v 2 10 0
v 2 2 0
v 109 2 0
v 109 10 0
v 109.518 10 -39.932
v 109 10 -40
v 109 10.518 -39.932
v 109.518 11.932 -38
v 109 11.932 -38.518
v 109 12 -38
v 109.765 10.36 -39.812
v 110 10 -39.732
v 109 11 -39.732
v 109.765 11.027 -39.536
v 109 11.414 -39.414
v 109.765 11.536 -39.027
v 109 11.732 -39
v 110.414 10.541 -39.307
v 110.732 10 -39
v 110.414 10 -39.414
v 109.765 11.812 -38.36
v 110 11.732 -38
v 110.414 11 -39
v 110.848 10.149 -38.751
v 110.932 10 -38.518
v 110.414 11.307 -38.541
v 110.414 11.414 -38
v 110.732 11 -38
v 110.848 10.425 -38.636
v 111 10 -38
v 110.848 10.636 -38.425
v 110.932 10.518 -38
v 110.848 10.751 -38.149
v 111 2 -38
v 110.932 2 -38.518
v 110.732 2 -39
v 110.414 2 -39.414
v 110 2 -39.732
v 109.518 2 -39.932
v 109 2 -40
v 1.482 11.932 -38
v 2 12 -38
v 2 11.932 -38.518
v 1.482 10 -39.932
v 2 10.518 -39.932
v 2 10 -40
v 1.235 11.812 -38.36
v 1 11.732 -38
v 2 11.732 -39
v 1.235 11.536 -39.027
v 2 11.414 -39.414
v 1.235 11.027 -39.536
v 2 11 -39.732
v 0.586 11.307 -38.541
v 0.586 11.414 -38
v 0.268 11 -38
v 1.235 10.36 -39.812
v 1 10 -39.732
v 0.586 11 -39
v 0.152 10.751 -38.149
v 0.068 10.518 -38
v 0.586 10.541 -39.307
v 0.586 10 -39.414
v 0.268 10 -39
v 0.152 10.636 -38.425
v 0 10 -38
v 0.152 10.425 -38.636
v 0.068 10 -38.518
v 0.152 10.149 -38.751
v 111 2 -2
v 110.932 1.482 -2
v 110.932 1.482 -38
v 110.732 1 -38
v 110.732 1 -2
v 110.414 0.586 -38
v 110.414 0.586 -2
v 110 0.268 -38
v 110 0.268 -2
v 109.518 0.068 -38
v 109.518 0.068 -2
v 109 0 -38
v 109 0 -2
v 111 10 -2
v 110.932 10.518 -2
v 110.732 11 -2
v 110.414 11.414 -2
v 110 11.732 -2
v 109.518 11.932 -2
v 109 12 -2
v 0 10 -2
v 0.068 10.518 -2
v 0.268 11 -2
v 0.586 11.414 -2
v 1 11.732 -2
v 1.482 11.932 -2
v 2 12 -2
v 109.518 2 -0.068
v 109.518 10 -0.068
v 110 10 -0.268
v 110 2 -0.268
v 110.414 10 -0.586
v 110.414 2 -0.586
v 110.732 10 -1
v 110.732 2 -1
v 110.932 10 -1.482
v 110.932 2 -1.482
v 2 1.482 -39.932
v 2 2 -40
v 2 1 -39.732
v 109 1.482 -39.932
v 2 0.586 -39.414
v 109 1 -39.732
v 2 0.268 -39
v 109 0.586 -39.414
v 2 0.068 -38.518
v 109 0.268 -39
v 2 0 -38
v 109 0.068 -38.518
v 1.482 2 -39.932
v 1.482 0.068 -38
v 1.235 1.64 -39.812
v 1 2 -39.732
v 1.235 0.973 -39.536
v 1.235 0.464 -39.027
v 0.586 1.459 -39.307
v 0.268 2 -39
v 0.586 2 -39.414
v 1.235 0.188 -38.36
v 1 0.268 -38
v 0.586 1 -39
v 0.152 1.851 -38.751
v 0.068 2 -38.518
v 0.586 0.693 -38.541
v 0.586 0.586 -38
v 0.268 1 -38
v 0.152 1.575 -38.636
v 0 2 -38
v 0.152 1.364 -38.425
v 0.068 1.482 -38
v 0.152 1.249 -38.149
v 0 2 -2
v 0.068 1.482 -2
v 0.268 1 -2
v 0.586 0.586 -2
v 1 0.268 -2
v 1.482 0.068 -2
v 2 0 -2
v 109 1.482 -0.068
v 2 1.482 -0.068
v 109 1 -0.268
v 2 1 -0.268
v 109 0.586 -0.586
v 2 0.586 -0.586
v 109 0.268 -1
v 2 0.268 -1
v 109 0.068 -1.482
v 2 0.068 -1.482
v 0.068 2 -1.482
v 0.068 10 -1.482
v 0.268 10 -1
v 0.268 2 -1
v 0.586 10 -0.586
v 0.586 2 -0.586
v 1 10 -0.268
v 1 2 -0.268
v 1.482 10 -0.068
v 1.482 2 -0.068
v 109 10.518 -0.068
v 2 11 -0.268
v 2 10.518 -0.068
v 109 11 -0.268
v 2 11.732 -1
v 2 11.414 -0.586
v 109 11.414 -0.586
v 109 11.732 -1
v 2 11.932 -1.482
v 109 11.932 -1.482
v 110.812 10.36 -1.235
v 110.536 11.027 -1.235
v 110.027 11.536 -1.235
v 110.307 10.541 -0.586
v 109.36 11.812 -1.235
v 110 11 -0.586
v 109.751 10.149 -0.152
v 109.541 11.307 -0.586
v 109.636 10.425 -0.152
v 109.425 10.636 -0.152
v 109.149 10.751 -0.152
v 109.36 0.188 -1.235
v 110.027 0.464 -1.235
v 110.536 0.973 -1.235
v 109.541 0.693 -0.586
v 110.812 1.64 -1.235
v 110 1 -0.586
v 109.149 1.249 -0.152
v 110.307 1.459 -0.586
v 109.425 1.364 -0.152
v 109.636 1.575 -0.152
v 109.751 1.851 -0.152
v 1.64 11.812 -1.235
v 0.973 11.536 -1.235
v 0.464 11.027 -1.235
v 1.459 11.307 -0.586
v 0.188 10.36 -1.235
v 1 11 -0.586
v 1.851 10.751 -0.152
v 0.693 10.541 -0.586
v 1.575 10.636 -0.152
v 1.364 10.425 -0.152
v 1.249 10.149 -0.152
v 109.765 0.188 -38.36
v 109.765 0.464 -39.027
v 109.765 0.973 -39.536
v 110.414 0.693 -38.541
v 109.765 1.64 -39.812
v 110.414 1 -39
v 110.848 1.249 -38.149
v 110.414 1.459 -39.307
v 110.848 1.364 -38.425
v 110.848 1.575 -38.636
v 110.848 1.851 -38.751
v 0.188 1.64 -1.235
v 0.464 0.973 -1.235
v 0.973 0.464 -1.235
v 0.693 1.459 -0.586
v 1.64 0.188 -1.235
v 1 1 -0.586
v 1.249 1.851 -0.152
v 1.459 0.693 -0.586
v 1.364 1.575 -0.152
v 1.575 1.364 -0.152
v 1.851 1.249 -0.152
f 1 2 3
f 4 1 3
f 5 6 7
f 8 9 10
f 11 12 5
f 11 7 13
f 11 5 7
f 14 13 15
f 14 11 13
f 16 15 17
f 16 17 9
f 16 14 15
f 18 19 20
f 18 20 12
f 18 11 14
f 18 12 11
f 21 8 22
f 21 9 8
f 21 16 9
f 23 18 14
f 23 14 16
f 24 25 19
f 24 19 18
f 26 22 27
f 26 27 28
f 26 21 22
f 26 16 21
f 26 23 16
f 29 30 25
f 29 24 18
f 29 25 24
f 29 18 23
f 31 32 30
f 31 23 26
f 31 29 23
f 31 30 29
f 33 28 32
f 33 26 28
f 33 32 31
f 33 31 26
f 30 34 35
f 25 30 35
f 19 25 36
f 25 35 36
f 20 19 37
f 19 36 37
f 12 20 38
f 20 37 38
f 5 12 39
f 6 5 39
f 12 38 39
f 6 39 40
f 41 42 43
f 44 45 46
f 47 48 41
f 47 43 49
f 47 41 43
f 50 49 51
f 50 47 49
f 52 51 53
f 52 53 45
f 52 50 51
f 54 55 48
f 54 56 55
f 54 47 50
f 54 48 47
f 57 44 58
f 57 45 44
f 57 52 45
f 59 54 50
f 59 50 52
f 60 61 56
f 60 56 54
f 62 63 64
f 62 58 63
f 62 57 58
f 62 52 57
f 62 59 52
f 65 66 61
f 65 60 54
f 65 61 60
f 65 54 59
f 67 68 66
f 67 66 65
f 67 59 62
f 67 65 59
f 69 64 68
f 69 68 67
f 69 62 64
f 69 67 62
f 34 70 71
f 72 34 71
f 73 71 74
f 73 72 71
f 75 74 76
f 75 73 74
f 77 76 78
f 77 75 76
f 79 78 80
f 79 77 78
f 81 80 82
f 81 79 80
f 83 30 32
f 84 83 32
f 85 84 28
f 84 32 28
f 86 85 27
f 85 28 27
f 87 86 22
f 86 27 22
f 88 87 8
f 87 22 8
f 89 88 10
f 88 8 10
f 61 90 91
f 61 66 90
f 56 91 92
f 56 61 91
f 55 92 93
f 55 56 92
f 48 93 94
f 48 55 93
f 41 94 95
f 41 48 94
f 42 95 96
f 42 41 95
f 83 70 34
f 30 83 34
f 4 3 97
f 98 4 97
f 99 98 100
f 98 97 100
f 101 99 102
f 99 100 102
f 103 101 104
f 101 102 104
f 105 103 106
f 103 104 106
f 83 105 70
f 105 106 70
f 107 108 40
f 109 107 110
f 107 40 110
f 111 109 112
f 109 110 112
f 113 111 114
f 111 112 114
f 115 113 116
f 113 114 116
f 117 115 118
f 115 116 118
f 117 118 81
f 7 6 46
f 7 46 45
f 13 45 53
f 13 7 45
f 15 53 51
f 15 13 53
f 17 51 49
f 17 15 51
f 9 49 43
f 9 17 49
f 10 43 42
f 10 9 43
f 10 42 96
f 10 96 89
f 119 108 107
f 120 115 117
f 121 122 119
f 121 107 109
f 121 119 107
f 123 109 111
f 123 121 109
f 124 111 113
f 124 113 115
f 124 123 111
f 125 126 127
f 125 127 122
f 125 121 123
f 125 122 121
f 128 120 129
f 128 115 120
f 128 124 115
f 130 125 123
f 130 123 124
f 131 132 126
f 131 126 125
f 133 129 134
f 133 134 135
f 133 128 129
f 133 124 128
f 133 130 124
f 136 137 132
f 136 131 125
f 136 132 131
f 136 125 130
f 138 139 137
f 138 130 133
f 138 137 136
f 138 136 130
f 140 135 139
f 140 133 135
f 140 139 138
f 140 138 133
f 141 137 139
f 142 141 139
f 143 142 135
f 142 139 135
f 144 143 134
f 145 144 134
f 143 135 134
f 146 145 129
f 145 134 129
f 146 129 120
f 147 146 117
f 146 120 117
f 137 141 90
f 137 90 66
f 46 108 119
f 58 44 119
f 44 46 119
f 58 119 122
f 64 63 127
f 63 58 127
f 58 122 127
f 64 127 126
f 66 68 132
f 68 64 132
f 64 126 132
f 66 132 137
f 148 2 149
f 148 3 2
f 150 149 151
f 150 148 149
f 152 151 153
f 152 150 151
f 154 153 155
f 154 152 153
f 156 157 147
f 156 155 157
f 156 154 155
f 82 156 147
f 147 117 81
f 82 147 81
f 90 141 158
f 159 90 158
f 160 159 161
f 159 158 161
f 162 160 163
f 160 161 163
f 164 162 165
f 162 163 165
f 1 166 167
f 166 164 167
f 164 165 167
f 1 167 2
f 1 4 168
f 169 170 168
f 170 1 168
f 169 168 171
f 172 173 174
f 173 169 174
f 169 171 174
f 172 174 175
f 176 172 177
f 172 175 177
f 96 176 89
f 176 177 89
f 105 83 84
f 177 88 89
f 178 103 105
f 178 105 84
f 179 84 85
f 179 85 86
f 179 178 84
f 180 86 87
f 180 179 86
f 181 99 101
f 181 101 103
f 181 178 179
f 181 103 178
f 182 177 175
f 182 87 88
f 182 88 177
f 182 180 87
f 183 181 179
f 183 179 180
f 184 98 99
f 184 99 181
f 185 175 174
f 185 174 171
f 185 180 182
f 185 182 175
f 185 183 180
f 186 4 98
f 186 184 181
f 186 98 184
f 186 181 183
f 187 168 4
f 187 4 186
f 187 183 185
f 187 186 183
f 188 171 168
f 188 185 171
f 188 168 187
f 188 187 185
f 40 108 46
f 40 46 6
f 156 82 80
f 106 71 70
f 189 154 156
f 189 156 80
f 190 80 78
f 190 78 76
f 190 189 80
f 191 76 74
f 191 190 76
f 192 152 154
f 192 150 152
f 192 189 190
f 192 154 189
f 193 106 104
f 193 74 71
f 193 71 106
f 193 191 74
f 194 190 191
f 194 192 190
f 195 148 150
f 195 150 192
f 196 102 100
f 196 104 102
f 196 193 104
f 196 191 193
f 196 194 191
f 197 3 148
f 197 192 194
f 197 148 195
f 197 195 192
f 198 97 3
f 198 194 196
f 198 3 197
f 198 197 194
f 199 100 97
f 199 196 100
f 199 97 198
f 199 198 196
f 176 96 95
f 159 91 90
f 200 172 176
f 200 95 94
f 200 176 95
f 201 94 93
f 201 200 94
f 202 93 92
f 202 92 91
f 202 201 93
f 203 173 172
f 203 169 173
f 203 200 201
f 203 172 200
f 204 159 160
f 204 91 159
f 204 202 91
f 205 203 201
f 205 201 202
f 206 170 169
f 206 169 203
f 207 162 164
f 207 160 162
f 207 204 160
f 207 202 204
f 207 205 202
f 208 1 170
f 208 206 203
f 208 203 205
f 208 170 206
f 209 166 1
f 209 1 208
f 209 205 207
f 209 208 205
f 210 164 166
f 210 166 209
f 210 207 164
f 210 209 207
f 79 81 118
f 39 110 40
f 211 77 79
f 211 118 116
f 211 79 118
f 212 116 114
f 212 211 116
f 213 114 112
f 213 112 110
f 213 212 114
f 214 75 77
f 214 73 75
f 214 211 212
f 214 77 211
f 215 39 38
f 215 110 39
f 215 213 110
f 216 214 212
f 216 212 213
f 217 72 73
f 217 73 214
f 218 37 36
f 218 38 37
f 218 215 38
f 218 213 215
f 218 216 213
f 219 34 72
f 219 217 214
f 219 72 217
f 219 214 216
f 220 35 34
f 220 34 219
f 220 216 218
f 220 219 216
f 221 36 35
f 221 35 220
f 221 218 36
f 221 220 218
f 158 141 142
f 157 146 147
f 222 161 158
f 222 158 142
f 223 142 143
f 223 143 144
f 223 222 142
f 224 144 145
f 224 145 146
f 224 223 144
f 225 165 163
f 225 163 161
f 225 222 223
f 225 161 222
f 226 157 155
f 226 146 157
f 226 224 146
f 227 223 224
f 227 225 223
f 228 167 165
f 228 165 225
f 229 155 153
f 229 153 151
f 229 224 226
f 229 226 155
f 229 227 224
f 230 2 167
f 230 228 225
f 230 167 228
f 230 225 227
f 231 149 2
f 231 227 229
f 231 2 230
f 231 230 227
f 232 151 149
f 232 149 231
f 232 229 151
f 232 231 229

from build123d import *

# Parameters (mm, degrees)
ESBO_O1_W                = 111
ESBO_O1_H                = 40
RESSALTO_EXTRUS_O1_DEPTH = 12
FILETE1_R                = 2
FILETE2_R                = 2


with BuildPart() as part:
    # Esboço1 → Ressalto-extrusão1 (new body)
    with BuildSketch(Plane(origin=(0, 0, 0), x_dir=(1, 0, 0), z_dir=(0, 1, 0))):
        with Locations((55.5, 20)):
            Rectangle(ESBO_O1_W, ESBO_O1_H)
    extrude(amount=RESSALTO_EXTRUS_O1_DEPTH)

    # Filete1
    filete1_edges = [part.edges().sort_by_distance(p)[0] for p in [
        (111, 12, -20),
        (55.5, 12, -40),
        (0, 12, -20),
        (55.5, 0, -40),
        (111, 0, -20),
        (55.5, 0, 0),
        (0, 0, -20),
        (55.5, 12, 0),
    ]]
    fillet(filete1_edges, radius=FILETE1_R)

    # Filete2
    # the kernel refuses this fillet: 2 mm, written as the material it takes off along each edge
    with BuildSketch(Plane(origin=(2, 2, -38), x_dir=(0, 0, -1), z_dir=(-1, 0, 0))) as filete2_piece_1_section:
        Polygon((0, 0), (FILETE2_R, 0), (FILETE2_R, FILETE2_R), (0, FILETE2_R), align=None)
    filete2_piece_1 = extrude(amount=FILETE2_R, mode=Mode.PRIVATE)
    filete2_piece_1 = filete2_piece_1 - Plane(origin=(2, 2, -38), x_dir=(0, 0.7071067811865475, 0.7071067811865475), z_dir=(-1, 0, 0)) * Sphere(FILETE2_R, mode=Mode.PRIVATE)
    add(filete2_piece_1, mode=Mode.SUBTRACT)
    with BuildSketch(Plane(origin=(109, 2, -38), x_dir=(0, 0, -1), z_dir=(1, 0, 0))) as filete2_piece_2_section:
        Polygon((0, 0), (FILETE2_R, 0), (FILETE2_R, -FILETE2_R), (0, -FILETE2_R), align=None)
    filete2_piece_2 = extrude(amount=FILETE2_R, mode=Mode.PRIVATE)
    filete2_piece_2 = filete2_piece_2 - Plane(origin=(109, 2, -38), x_dir=(0, 0.7071067811865475, 0.7071067811865475), z_dir=(1, 0, 0)) * Sphere(FILETE2_R, mode=Mode.PRIVATE)
    add(filete2_piece_2, mode=Mode.SUBTRACT)
    with BuildSketch(Plane(origin=(2, 2, -2), x_dir=(-1, 0, 0), z_dir=(0, 0, 1))) as filete2_piece_3_section:
        Polygon((0, 0), (FILETE2_R, 0), (FILETE2_R, FILETE2_R), (0, FILETE2_R), align=None)
    filete2_piece_3 = extrude(amount=FILETE2_R, mode=Mode.PRIVATE)
    filete2_piece_3 = filete2_piece_3 - Plane(origin=(2, 2, -2), x_dir=(0.7071067811865475, 0.7071067811865475, 0), z_dir=(0, 0, 1)) * Sphere(FILETE2_R, mode=Mode.PRIVATE)
    add(filete2_piece_3, mode=Mode.SUBTRACT)
    with BuildSketch(Plane(origin=(109, 2, -2), x_dir=(1, 0, 0), z_dir=(0, 0, 1))) as filete2_piece_4_section:
        Polygon((0, 0), (FILETE2_R, 0), (FILETE2_R, -FILETE2_R), (0, -FILETE2_R), align=None)
    filete2_piece_4 = extrude(amount=FILETE2_R, mode=Mode.PRIVATE)
    filete2_piece_4 = filete2_piece_4 - Plane(origin=(109, 2, -2), x_dir=(-0.7071067811865475, 0.7071067811865475, 0), z_dir=(0, 0, 1)) * Sphere(FILETE2_R, mode=Mode.PRIVATE)
    add(filete2_piece_4, mode=Mode.SUBTRACT)
    with BuildSketch(Plane(origin=(109, 10, -2), x_dir=(1, 0, 0), z_dir=(0, 0, 1))) as filete2_piece_5_section:
        Polygon((0, 0), (FILETE2_R, 0), (FILETE2_R, FILETE2_R), (0, FILETE2_R), align=None)
    filete2_piece_5 = extrude(amount=FILETE2_R, mode=Mode.PRIVATE)
    filete2_piece_5 = filete2_piece_5 - Plane(origin=(109, 10, -2), x_dir=(-0.7071067811865475, -0.7071067811865475, 0), z_dir=(0, 0, 1)) * Sphere(FILETE2_R, mode=Mode.PRIVATE)
    add(filete2_piece_5, mode=Mode.SUBTRACT)
    with BuildSketch(Plane(origin=(2, 10, -2), x_dir=(-1, 0, 0), z_dir=(0, 0, 1))) as filete2_piece_6_section:
        Polygon((0, 0), (FILETE2_R, 0), (FILETE2_R, -FILETE2_R), (0, -FILETE2_R), align=None)
    filete2_piece_6 = extrude(amount=FILETE2_R, mode=Mode.PRIVATE)
    filete2_piece_6 = filete2_piece_6 - Plane(origin=(2, 10, -2), x_dir=(0.7071067811865475, -0.7071067811865475, 0), z_dir=(0, 0, 1)) * Sphere(FILETE2_R, mode=Mode.PRIVATE)
    add(filete2_piece_6, mode=Mode.SUBTRACT)
    with BuildSketch(Plane(origin=(109, 10, -38), x_dir=(0, 0, -1), z_dir=(1, 0, 0))) as filete2_piece_7_section:
        Polygon((0, 0), (FILETE2_R, 0), (FILETE2_R, FILETE2_R), (0, FILETE2_R), align=None)
    filete2_piece_7 = extrude(amount=FILETE2_R, mode=Mode.PRIVATE)
    filete2_piece_7 = filete2_piece_7 - Plane(origin=(109, 10, -38), x_dir=(0, -0.7071067811865475, 0.7071067811865475), z_dir=(1, 0, 0)) * Sphere(FILETE2_R, mode=Mode.PRIVATE)
    add(filete2_piece_7, mode=Mode.SUBTRACT)
    with BuildSketch(Plane(origin=(2, 10, -38), x_dir=(0, 0, -1), z_dir=(-1, 0, 0))) as filete2_piece_8_section:
        Polygon((0, 0), (FILETE2_R, 0), (FILETE2_R, -FILETE2_R), (0, -FILETE2_R), align=None)
    filete2_piece_8 = extrude(amount=FILETE2_R, mode=Mode.PRIVATE)
    filete2_piece_8 = filete2_piece_8 - Plane(origin=(2, 10, -38), x_dir=(0, -0.7071067811865475, 0.7071067811865475), z_dir=(-1, 0, 0)) * Sphere(FILETE2_R, mode=Mode.PRIVATE)
    add(filete2_piece_8, mode=Mode.SUBTRACT)
    with BuildSketch(Plane(origin=(111, 2, 0), x_dir=(-1, 0, 0), z_dir=(0, 1, 0)), Plane(origin=(111, 2, -40), x_dir=(0, 0, 1), z_dir=(0, 1, 0))) as filete2_piece_9:
        with BuildLine():
            CenterArc((FILETE2_R, -FILETE2_R), FILETE2_R, 90, 90)
            Line((0, -FILETE2_R), (0, 0))
            Line((0, 0), (FILETE2_R, 0))
        make_face()
    extrude(amount=8, mode=Mode.SUBTRACT)
    with BuildSketch(Plane(origin=(0, 2, 0), x_dir=(1, 0, 0), z_dir=(0, 1, 0)), Plane(origin=(0, 2, -40), x_dir=(0, 0, 1), z_dir=(0, 1, 0))) as filete2_piece_10:
        with BuildLine():
            CenterArc((FILETE2_R, FILETE2_R), FILETE2_R, 180, 90)
            Line((0, FILETE2_R), (0, 0))
            Line((0, 0), (FILETE2_R, 0))
        make_face()
    extrude(amount=8, mode=Mode.SUBTRACT)


solid = part.part
